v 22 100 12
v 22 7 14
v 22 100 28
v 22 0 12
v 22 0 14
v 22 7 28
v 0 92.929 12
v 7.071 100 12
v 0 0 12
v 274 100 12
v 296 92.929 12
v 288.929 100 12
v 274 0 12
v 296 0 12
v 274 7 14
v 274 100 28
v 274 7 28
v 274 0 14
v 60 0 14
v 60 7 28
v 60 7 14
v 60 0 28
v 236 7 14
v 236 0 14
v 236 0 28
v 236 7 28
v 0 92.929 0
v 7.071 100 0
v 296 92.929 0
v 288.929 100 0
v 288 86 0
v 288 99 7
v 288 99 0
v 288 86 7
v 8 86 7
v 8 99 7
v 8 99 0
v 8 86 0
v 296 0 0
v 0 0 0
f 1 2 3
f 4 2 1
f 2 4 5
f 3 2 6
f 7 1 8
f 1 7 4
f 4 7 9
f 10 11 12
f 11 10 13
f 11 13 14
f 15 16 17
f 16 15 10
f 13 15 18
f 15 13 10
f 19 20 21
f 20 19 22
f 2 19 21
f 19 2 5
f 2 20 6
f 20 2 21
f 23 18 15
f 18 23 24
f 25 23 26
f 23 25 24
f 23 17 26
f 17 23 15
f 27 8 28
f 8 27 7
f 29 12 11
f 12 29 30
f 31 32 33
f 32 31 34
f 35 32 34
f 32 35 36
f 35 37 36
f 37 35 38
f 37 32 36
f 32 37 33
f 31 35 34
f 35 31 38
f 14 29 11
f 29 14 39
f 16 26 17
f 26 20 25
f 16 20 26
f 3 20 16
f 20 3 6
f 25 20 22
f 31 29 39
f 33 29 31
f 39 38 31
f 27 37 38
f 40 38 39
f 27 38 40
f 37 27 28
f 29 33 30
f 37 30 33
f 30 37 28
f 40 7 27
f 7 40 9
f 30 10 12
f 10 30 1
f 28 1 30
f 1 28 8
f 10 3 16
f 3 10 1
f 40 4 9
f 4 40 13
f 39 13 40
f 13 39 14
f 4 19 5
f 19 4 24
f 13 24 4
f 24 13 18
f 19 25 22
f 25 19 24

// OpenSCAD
include <../src/wardrobe.scad>;
plank_yx_side_top();
//github_openscad -o wardrobe_2/plank_yx_side_top.stl -D wardrobe_n=2 -D cutting_edge=0 -D break_view_length=0 wardrobe_2/plank_yx_side_top_stl.scad
